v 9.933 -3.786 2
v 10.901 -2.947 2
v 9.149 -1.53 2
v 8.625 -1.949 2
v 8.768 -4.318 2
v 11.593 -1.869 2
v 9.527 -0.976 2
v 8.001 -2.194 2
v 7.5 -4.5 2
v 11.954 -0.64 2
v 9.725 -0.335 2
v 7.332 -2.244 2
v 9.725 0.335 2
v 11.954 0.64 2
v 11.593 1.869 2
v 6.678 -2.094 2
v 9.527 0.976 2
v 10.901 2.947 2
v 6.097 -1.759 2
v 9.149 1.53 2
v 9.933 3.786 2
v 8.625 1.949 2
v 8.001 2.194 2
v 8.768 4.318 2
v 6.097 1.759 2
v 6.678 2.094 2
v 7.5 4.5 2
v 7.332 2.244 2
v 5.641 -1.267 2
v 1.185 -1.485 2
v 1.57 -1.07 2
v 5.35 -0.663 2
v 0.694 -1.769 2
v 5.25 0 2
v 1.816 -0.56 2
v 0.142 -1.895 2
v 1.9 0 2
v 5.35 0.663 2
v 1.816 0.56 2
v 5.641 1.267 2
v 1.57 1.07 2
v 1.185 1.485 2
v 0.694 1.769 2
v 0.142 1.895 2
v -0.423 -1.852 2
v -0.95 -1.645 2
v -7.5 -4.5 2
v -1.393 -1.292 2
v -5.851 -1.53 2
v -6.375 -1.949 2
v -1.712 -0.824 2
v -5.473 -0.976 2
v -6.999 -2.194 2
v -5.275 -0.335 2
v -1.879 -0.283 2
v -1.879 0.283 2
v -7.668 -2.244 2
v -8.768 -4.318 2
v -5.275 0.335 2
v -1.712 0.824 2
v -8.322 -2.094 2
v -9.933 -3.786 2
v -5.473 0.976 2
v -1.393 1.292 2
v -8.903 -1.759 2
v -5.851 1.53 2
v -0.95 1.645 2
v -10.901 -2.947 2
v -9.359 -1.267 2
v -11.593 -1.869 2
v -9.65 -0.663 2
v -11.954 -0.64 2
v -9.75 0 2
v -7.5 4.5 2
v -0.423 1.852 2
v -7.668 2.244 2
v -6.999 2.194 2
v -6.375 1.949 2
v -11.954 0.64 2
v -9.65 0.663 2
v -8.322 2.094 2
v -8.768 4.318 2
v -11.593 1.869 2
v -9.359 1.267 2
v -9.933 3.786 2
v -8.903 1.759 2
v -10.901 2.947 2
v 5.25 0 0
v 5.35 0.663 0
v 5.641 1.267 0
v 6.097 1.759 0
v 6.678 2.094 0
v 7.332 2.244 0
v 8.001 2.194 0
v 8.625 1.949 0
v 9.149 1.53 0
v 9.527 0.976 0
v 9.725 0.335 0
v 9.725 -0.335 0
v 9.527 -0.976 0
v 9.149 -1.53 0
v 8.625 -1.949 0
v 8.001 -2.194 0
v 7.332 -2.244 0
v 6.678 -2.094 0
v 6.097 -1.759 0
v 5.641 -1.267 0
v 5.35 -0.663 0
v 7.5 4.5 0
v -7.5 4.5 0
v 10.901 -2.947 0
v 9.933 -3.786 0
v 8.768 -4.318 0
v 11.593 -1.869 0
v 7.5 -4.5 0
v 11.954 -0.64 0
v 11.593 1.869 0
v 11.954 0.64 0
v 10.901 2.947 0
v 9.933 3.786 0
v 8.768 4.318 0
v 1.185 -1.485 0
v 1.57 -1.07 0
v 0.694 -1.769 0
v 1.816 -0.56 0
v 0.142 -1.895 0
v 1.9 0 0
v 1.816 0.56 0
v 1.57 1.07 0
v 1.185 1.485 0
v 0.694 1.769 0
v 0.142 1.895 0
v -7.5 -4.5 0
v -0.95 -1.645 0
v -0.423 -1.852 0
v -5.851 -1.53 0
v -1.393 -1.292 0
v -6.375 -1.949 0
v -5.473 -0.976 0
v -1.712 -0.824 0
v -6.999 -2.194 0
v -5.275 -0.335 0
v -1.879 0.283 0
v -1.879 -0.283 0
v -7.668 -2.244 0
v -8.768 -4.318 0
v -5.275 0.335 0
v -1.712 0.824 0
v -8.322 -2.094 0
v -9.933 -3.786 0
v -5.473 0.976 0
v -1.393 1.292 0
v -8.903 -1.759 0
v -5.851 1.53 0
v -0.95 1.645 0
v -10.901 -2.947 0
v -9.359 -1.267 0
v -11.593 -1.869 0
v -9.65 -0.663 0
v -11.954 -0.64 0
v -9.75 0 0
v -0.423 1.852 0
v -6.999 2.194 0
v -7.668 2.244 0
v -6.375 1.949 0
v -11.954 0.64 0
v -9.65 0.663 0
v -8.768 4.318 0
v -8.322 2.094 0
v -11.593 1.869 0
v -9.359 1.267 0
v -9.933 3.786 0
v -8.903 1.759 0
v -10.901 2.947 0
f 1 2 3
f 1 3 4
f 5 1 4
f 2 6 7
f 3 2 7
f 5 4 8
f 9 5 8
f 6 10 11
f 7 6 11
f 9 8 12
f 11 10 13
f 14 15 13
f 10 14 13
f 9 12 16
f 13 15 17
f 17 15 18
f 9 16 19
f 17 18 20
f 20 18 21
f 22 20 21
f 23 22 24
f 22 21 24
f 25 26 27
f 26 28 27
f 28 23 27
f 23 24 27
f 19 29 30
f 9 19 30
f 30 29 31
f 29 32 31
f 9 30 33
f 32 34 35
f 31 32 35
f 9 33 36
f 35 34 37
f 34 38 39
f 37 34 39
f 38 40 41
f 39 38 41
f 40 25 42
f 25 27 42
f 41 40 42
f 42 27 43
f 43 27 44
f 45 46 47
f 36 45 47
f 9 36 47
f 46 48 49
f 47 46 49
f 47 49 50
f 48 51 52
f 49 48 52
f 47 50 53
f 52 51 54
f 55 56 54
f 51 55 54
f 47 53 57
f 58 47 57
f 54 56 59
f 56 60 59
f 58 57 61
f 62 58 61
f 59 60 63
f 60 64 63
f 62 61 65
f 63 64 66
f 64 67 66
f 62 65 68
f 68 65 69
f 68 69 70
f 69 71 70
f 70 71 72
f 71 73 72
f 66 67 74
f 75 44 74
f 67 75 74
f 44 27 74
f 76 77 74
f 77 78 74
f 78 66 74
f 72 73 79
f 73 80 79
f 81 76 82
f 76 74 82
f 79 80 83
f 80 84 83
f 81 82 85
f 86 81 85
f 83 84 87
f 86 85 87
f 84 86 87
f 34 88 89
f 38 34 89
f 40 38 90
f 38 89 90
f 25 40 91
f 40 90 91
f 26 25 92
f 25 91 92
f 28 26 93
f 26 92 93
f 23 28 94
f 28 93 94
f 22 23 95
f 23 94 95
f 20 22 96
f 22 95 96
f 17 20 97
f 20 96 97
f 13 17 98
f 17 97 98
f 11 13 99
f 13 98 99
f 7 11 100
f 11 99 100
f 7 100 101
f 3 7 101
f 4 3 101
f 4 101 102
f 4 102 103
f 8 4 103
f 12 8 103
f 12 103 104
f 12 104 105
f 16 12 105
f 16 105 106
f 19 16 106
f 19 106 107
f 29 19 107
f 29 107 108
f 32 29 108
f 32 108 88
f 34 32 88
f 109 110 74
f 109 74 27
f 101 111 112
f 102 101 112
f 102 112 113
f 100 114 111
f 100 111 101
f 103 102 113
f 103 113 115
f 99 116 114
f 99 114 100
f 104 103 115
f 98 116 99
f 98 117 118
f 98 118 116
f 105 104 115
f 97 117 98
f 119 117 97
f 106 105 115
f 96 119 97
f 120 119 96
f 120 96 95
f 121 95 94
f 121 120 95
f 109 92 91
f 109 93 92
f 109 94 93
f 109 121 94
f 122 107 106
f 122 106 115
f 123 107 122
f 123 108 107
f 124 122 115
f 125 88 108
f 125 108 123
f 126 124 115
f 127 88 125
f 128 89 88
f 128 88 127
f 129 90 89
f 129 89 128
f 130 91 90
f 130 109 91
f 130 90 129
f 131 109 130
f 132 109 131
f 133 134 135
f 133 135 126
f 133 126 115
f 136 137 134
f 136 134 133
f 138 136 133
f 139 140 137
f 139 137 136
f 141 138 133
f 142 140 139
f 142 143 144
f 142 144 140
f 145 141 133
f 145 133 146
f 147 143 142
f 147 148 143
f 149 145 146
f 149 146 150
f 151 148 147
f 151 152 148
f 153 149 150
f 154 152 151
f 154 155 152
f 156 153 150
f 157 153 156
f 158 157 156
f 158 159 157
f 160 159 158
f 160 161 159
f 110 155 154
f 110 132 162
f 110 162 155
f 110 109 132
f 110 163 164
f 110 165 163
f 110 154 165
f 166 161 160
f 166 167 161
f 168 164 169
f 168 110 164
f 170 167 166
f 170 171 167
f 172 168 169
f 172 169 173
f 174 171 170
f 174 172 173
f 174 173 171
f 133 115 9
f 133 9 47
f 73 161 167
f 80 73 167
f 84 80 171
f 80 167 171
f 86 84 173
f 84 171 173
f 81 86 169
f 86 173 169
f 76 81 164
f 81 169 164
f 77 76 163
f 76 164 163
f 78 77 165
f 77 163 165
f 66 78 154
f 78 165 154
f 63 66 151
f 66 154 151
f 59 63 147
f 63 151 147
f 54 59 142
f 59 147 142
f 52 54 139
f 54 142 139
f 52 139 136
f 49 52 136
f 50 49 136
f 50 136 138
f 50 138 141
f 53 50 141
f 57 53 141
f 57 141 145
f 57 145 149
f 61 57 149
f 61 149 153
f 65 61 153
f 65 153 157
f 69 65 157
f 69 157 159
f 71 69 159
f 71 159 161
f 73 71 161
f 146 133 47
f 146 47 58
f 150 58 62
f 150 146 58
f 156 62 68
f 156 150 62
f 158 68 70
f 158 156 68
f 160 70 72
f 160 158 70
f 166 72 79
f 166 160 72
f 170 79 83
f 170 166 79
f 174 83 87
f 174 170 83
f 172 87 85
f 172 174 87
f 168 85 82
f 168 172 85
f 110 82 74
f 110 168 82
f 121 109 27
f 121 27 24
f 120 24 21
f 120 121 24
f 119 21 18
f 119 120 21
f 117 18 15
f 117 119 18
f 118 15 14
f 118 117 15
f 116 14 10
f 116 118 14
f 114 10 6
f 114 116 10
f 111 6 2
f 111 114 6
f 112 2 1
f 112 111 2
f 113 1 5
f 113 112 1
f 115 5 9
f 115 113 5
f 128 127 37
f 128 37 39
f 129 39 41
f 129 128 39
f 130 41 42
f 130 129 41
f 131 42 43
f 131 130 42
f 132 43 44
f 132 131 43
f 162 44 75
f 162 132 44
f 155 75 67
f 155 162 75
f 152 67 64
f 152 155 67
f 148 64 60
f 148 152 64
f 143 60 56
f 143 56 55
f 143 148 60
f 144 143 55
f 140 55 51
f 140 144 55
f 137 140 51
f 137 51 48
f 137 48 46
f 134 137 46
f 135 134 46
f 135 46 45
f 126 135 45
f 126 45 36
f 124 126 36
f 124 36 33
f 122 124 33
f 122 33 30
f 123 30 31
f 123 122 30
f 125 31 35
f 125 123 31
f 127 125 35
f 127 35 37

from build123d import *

# Parameters (mm, degrees)
SKETCH1_R            = 1.9
BOSS_EXTRUDE1_DEPTH  = 2
M4_CLEARANCE_HOLE1_D = 4.5


with BuildPart() as part:
    # Sketch1 → Boss-Extrude1 (new body)
    with BuildSketch(Plane.XY):
        with BuildLine():
            Line((-7.5, 4.5), (7.5, 4.5))
            ThreePointArc((7.5, 4.5), (12, 0), (7.5, -4.5))
            Line((7.5, -4.5), (-7.5, -4.5))
            ThreePointArc((-7.5, -4.5), (-12, 0), (-7.5, 4.5))
        make_face()
        Circle(SKETCH1_R, mode=Mode.SUBTRACT)
    extrude(amount=BOSS_EXTRUDE1_DEPTH)

    # M4 Clearance Hole1 (through all)
    with Locations(Plane.XY.offset(2)):
        with Locations((-7.5, 0), (7.5, 0)):
            Hole(M4_CLEARANCE_HOLE1_D / 2)


solid = part.part
